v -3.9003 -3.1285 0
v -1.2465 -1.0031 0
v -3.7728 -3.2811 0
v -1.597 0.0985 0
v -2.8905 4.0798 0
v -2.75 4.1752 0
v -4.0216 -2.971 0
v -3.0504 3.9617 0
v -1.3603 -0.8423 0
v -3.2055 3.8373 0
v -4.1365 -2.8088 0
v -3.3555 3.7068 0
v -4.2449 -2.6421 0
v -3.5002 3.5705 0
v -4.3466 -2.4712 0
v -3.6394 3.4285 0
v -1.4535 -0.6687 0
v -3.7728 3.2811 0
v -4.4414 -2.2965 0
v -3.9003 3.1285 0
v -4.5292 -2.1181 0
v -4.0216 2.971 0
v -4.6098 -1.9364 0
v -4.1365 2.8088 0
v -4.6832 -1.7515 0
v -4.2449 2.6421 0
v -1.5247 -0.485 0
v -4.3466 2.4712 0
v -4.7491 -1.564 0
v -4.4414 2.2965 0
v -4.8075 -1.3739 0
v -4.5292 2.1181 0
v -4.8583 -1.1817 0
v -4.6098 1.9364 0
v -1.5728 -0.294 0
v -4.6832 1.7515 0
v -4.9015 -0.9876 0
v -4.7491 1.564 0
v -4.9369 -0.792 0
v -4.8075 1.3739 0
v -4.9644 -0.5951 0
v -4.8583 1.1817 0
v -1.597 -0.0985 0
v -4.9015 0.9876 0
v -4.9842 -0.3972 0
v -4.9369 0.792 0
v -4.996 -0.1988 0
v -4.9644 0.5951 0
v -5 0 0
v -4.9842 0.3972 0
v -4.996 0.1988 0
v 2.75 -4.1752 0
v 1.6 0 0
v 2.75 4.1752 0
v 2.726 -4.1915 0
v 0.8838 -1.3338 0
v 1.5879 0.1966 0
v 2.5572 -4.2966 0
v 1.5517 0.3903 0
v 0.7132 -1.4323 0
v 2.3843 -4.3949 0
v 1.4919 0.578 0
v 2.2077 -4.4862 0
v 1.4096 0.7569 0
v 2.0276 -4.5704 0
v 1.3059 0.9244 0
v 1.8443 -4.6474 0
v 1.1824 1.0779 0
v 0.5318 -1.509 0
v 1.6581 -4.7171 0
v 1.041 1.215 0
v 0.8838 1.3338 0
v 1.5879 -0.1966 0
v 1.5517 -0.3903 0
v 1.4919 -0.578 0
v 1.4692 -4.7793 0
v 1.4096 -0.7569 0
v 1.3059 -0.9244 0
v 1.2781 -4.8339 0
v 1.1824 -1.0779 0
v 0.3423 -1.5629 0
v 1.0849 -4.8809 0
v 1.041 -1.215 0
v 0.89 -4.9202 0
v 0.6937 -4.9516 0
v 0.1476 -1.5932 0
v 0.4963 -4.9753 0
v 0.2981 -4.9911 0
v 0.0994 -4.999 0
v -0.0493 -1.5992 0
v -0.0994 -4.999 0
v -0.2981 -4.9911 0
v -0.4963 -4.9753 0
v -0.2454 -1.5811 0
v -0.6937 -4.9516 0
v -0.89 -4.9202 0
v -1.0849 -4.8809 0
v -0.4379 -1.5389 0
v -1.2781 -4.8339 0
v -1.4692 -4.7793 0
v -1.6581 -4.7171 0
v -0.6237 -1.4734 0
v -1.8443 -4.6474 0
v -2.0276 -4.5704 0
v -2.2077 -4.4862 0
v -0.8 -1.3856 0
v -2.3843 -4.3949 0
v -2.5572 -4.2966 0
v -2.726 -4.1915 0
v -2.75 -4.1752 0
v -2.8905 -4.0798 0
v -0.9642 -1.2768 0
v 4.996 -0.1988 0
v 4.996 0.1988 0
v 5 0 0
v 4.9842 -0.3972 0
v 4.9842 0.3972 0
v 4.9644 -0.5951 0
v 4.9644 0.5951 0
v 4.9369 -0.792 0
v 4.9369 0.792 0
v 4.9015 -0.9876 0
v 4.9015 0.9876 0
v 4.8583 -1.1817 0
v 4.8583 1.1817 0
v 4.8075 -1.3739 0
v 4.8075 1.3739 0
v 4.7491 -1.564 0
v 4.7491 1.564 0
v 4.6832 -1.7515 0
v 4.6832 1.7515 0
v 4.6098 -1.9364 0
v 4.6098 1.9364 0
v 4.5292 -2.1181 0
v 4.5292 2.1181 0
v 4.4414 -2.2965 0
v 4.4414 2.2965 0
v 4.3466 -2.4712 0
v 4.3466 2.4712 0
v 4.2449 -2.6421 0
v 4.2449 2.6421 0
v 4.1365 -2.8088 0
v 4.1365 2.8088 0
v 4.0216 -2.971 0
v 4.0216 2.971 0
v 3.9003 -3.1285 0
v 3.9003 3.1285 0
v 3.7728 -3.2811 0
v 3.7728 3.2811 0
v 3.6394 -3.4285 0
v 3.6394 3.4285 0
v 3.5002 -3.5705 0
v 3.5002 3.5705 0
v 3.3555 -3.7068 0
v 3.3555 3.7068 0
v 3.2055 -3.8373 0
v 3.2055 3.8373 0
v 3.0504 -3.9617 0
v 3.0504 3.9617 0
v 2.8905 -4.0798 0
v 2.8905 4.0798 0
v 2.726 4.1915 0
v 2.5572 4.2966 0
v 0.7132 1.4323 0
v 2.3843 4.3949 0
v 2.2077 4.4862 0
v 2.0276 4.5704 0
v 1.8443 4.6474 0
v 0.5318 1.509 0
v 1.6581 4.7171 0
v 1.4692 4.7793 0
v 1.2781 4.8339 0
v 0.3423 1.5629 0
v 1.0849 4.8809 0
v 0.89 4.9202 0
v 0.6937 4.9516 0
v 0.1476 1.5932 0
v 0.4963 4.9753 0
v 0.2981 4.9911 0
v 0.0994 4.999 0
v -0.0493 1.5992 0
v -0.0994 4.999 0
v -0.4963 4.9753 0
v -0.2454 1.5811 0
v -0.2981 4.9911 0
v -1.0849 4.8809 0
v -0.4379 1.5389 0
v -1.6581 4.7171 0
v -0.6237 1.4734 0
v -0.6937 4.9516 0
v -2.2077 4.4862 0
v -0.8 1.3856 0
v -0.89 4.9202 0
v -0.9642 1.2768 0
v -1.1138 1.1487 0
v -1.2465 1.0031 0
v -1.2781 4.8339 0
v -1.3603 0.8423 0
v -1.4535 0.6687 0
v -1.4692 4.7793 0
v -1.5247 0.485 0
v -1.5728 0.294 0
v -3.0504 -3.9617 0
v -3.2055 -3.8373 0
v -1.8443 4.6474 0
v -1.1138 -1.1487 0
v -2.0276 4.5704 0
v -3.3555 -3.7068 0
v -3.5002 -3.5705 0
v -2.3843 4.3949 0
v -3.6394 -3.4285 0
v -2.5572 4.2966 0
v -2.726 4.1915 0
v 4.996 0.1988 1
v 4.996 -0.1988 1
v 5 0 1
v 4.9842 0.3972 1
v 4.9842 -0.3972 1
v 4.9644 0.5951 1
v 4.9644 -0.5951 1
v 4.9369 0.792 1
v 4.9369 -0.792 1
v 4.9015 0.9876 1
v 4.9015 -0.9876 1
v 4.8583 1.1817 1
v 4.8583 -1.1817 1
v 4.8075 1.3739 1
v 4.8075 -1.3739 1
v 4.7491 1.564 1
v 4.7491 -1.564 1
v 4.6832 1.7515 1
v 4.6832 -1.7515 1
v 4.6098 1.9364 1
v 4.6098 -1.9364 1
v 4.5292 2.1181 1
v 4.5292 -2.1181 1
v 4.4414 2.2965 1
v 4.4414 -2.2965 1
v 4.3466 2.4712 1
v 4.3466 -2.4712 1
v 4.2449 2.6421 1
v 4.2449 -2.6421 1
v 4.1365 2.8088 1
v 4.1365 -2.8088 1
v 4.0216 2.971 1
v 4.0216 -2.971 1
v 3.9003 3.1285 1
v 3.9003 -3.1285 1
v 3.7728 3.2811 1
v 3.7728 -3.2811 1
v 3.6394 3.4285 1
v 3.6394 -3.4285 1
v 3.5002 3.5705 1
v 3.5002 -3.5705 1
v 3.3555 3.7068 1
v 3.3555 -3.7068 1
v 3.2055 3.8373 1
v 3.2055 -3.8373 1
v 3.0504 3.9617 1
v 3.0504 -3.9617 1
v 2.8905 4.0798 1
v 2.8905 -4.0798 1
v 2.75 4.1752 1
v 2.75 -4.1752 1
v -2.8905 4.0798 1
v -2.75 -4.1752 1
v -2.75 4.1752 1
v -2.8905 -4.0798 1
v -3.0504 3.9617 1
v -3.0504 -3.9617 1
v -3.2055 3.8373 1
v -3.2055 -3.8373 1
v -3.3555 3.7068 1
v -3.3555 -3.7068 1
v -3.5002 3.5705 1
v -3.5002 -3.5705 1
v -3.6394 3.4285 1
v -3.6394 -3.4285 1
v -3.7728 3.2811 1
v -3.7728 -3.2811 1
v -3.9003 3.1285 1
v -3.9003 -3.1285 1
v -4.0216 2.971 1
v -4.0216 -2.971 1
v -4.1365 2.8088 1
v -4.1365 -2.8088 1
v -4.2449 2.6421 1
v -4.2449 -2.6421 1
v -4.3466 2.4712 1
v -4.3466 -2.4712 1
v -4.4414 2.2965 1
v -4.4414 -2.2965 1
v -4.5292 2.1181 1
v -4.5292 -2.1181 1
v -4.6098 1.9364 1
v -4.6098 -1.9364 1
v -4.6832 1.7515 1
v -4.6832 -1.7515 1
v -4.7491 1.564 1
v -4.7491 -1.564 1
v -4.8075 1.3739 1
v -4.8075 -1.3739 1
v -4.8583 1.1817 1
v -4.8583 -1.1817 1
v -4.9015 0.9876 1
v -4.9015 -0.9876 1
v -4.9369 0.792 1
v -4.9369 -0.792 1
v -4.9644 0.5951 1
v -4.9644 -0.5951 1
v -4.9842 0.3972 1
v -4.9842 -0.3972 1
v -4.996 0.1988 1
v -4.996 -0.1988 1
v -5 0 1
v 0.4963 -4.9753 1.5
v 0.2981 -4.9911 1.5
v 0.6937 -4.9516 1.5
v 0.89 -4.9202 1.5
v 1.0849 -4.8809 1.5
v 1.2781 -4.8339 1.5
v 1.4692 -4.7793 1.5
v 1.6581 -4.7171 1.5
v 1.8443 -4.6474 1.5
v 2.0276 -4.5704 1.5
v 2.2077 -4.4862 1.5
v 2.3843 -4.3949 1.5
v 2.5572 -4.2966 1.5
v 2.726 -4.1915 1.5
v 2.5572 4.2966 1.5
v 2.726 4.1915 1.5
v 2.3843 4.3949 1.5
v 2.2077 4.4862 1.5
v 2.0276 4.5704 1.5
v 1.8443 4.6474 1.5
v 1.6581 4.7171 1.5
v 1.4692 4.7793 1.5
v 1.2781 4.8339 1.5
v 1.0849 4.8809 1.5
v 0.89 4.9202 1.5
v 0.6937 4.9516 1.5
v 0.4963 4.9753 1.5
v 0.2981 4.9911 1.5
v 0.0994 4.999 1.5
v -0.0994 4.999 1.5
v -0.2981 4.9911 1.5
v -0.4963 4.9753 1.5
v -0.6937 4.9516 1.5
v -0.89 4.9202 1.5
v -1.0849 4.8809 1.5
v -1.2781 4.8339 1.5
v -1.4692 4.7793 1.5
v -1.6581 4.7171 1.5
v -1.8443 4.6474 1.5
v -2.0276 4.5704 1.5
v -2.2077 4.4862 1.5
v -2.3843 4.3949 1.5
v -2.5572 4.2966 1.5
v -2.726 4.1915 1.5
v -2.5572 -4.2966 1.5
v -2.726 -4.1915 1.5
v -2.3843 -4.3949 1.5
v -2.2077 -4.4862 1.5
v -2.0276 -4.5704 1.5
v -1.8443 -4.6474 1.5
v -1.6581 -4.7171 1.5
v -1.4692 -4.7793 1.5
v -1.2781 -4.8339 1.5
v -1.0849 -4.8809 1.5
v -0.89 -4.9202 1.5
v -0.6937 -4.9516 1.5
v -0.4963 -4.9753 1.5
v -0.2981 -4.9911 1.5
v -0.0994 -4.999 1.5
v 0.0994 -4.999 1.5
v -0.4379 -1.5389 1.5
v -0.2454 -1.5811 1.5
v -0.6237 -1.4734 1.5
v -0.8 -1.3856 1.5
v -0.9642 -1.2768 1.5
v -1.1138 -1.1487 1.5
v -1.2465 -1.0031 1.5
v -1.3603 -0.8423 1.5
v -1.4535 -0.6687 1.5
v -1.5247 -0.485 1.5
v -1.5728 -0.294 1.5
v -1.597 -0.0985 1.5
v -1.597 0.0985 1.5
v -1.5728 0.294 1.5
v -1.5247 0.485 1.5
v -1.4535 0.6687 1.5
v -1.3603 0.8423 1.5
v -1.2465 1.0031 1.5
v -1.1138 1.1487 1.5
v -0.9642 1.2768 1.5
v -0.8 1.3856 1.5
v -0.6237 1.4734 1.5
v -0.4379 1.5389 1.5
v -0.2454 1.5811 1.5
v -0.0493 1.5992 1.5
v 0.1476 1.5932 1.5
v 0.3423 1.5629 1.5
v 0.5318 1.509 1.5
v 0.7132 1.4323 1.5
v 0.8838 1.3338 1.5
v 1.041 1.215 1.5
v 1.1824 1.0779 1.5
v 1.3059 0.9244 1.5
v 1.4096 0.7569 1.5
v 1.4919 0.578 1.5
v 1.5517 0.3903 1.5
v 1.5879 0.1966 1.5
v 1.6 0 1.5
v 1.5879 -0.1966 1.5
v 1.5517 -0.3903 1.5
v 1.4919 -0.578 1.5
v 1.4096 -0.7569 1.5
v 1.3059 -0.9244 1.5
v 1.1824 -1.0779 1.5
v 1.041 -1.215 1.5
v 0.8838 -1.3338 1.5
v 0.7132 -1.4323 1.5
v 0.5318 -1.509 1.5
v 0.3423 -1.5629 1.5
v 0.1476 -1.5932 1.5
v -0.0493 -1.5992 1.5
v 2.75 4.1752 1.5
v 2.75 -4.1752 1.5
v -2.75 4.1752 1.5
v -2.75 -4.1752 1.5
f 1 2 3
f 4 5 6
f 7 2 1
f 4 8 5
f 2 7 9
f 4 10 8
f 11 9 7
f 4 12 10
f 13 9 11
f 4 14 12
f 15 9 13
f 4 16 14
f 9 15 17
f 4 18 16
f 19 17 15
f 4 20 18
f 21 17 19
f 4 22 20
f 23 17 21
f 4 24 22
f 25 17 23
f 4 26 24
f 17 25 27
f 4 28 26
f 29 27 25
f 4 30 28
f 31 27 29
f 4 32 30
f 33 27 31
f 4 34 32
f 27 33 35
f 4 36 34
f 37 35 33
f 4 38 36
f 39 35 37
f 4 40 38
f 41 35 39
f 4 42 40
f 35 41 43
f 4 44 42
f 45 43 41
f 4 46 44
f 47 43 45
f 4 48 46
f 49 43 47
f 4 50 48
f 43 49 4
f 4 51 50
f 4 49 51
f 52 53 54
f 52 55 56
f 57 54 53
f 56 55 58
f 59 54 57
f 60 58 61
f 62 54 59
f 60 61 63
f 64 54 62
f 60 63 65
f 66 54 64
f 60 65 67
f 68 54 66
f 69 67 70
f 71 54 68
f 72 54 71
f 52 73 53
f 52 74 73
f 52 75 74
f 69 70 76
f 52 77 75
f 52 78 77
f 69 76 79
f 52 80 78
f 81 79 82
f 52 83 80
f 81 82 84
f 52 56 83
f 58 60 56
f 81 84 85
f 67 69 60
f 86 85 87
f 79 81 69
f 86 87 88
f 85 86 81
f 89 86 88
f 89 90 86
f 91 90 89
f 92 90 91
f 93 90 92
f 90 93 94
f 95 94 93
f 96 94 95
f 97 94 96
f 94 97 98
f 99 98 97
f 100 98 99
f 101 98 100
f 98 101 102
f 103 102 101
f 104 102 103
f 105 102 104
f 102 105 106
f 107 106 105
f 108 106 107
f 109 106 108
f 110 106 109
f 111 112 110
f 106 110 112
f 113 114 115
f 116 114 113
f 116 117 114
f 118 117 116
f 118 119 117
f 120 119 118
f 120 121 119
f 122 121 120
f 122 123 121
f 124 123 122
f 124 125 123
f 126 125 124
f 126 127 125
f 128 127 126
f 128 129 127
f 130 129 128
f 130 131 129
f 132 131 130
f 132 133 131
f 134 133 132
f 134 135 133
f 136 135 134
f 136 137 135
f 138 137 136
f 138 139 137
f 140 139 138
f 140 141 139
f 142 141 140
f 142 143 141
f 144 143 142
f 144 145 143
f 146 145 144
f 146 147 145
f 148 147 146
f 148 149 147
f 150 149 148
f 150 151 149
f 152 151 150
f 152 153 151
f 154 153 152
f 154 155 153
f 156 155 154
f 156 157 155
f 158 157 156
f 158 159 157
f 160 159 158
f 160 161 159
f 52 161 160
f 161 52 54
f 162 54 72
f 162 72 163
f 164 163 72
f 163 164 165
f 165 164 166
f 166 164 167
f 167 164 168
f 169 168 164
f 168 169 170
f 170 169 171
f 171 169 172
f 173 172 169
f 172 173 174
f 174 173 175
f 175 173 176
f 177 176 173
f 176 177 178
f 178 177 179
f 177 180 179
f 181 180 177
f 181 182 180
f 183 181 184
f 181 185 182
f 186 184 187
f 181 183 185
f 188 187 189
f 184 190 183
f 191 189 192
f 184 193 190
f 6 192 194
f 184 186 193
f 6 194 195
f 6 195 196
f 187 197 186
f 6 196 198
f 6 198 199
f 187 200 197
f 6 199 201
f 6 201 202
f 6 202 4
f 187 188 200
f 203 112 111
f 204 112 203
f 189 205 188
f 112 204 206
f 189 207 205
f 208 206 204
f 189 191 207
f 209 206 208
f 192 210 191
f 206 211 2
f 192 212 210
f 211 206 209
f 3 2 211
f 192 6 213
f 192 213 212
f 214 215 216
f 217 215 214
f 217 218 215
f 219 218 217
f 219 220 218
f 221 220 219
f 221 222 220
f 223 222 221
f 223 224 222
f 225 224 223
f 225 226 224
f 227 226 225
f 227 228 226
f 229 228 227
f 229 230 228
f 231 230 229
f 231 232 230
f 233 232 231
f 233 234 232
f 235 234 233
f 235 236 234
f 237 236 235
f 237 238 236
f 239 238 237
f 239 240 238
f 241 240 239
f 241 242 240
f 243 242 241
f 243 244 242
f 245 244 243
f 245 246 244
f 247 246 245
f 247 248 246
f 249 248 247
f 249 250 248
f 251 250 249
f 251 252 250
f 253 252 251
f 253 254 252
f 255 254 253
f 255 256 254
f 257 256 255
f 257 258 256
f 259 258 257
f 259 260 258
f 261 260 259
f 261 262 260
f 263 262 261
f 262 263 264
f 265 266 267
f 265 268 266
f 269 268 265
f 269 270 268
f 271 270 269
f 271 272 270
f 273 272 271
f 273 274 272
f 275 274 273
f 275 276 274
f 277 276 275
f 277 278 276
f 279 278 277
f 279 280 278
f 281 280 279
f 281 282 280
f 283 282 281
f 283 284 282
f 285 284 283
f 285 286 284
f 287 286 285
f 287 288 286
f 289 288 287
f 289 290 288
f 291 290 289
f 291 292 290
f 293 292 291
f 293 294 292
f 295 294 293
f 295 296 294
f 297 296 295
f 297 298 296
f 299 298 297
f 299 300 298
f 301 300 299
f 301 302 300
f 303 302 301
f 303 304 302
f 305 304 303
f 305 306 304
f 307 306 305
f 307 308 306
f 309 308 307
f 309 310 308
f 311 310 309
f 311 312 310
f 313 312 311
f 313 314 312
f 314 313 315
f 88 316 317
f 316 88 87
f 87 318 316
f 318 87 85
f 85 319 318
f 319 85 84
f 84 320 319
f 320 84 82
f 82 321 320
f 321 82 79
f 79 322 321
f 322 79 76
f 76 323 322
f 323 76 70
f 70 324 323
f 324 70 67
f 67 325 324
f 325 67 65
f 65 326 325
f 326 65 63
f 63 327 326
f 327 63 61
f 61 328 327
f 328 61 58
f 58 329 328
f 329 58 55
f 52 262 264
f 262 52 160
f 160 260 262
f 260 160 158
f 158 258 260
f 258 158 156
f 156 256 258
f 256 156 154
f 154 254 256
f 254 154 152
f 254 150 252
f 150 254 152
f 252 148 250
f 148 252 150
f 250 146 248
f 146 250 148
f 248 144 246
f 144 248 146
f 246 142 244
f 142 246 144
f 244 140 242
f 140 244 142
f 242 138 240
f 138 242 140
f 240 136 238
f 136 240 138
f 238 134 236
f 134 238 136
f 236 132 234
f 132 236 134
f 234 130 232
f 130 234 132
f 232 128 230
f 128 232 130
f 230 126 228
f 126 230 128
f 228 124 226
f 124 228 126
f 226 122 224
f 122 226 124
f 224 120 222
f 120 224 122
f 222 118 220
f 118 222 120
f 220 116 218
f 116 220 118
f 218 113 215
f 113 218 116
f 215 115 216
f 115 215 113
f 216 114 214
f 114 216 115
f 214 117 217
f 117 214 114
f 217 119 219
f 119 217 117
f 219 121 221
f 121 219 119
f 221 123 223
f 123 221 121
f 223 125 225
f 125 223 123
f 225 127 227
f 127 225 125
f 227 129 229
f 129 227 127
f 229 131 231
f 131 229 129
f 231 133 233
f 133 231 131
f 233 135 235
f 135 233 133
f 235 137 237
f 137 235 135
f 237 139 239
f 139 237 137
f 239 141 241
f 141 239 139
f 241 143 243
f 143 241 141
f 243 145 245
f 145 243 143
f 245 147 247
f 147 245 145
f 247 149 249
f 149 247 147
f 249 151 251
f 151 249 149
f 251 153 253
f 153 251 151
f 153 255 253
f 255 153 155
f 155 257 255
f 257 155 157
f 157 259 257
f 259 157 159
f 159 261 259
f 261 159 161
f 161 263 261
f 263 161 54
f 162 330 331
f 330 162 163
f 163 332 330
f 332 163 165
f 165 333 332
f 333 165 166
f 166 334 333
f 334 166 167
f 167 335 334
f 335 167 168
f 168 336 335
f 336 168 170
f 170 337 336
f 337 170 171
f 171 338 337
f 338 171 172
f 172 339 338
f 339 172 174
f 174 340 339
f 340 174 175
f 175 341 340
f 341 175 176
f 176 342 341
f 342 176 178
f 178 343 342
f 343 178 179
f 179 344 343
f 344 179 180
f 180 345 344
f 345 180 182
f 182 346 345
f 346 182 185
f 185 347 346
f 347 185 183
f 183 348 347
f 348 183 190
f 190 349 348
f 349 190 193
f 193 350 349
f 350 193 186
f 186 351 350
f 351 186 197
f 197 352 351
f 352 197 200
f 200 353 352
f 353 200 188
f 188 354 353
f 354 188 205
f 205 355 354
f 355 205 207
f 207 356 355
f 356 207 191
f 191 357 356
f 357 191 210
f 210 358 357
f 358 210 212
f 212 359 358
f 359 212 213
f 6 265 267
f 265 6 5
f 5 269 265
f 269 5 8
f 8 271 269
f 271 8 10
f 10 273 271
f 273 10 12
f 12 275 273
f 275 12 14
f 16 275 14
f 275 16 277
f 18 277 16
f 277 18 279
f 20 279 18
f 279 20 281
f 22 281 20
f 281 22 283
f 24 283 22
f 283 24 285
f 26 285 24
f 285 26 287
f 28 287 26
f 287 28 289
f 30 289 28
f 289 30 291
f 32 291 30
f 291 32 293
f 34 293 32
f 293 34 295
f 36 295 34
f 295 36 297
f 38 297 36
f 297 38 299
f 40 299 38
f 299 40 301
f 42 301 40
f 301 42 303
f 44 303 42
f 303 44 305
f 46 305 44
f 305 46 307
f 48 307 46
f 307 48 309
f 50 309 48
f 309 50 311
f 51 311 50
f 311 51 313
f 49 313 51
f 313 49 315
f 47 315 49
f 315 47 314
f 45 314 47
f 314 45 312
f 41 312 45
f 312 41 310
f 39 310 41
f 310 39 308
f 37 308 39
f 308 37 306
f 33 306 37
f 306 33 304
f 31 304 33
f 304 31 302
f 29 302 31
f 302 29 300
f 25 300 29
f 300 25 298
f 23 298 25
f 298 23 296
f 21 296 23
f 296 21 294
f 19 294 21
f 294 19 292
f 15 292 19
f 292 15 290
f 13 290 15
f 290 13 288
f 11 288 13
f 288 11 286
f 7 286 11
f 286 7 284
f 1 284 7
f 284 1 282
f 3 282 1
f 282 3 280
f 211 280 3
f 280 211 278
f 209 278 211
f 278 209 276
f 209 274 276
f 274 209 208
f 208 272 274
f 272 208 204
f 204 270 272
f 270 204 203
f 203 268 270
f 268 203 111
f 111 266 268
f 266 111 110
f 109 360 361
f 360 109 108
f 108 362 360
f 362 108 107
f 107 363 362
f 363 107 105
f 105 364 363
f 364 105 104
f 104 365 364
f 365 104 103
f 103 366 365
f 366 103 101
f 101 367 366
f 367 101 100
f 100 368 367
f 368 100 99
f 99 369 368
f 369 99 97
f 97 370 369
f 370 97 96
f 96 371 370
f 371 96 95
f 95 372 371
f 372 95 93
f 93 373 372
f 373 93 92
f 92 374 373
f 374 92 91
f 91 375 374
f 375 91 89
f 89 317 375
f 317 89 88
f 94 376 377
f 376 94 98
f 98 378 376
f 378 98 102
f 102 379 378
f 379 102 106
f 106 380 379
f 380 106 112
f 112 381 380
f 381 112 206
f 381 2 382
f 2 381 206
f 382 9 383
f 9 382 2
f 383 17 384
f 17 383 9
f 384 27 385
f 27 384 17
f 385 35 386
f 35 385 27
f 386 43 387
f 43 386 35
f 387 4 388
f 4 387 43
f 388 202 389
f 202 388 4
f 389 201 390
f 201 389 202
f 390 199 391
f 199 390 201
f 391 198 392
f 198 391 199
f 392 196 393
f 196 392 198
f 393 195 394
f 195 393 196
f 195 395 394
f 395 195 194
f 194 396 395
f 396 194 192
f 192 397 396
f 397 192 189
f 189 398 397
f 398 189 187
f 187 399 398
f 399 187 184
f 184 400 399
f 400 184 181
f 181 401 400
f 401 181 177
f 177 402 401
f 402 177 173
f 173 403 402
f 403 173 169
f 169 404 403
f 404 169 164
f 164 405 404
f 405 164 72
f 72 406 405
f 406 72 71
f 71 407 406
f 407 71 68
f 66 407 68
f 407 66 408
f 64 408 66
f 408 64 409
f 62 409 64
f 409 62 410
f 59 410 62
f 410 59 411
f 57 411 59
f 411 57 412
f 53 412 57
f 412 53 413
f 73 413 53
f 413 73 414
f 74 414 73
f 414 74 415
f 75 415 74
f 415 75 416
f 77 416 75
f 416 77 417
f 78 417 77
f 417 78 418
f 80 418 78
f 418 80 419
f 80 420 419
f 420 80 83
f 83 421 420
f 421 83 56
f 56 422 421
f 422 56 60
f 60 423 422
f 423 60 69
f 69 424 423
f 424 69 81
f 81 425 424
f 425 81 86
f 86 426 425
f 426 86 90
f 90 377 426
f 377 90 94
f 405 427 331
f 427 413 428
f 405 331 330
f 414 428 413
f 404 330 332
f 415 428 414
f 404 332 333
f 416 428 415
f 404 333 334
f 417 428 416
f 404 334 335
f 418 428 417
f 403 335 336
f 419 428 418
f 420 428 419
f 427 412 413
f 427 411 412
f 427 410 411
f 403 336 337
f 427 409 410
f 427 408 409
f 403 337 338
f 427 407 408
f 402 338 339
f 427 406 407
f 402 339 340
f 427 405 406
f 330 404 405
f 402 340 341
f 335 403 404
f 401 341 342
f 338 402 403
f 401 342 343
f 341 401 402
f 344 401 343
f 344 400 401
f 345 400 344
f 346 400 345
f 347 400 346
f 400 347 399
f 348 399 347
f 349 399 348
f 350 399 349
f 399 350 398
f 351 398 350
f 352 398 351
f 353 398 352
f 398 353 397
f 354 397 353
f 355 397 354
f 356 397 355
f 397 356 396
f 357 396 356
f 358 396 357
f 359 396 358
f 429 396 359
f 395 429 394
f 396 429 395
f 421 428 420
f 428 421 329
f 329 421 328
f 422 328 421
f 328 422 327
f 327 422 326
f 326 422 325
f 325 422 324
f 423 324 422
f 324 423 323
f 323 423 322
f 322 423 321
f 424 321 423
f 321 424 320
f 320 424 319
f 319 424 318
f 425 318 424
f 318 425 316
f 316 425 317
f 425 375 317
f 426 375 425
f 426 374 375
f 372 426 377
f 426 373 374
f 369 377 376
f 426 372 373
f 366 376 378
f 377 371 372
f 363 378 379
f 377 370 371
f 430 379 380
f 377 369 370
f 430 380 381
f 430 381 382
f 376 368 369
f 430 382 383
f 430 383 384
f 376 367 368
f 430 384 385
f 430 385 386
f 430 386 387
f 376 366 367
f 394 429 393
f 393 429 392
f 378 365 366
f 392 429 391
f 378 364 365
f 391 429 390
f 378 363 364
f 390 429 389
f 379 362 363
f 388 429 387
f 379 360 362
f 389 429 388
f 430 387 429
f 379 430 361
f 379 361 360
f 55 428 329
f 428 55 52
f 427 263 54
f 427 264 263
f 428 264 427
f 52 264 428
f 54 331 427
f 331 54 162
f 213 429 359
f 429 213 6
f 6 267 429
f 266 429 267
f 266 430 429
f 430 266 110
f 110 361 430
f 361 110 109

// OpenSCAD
$fs = .2;
$fa = 2;

linear_extrude(1) difference() {
	circle(5);
	circle(3.2 / 2);
}
linear_extrude(1.5) difference() {
	intersection() {
		circle(5);
		square([5.5, 10], center = true);
	}
	circle(3.2 / 2);
}
